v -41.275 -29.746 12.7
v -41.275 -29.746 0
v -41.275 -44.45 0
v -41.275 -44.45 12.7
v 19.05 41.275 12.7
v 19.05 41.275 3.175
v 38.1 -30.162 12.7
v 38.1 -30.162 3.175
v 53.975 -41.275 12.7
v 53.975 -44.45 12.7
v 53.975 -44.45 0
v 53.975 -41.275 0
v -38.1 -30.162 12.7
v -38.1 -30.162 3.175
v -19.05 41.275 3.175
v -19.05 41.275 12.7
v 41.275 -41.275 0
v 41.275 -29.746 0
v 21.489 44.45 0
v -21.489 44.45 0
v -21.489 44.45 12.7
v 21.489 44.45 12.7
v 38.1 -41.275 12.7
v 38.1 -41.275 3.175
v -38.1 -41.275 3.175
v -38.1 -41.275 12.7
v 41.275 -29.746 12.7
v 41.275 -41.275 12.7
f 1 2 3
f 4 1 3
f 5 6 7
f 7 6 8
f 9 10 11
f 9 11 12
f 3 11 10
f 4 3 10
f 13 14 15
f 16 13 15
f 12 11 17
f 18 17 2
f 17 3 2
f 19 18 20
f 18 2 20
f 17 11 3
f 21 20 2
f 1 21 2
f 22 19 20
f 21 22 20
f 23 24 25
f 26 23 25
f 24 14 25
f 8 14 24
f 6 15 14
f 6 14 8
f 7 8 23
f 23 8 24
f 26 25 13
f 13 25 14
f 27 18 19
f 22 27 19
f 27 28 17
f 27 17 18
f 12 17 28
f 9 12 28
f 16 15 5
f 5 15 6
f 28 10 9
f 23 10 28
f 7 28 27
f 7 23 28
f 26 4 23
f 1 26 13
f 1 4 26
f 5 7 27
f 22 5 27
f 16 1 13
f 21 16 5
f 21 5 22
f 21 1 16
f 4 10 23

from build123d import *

# Parameters (mm, degrees)
F2_DEPTH = 3.175
F3_DEPTH = 12.7
F4_W     = 3.175
F4_H     = 12.7
F5_DEPTH = 12.7


with BuildPart() as f2:
    # F0 (on Top) → F2 (new body)
    with BuildSketch(Plane.XY):
        Polygon((-38.1, -30.1625), (-38.1, -41.275), (38.1, -41.275), (38.1, -30.1625), (19.05, 41.275), (-19.05, 41.275), align=None)
    extrude(amount=F2_DEPTH)

    # F1 (on face) → F3 (join)
    with BuildSketch(Plane.XY):
        Polygon((21.489284, 44.45), (-21.489284, 44.45), (-41.275, -29.746436), (-41.275, -44.45), (41.275, -44.45), (41.275, -29.746436), align=None)
        Polygon((-38.1, -41.275), (-38.1, -30.1625), (-19.05, 41.275), (19.05, 41.275), (38.1, -30.1625), (38.1, -41.275), align=None, mode=Mode.SUBTRACT)
    extrude(amount=F3_DEPTH)

    # F4 (on face) → F5 (join)
    with BuildSketch(Plane.YZ.offset(41.275)):
        with Locations((-42.8625, 6.35)):
            Rectangle(F4_W, F4_H)
    extrude(amount=F5_DEPTH)


solid = f2.part
